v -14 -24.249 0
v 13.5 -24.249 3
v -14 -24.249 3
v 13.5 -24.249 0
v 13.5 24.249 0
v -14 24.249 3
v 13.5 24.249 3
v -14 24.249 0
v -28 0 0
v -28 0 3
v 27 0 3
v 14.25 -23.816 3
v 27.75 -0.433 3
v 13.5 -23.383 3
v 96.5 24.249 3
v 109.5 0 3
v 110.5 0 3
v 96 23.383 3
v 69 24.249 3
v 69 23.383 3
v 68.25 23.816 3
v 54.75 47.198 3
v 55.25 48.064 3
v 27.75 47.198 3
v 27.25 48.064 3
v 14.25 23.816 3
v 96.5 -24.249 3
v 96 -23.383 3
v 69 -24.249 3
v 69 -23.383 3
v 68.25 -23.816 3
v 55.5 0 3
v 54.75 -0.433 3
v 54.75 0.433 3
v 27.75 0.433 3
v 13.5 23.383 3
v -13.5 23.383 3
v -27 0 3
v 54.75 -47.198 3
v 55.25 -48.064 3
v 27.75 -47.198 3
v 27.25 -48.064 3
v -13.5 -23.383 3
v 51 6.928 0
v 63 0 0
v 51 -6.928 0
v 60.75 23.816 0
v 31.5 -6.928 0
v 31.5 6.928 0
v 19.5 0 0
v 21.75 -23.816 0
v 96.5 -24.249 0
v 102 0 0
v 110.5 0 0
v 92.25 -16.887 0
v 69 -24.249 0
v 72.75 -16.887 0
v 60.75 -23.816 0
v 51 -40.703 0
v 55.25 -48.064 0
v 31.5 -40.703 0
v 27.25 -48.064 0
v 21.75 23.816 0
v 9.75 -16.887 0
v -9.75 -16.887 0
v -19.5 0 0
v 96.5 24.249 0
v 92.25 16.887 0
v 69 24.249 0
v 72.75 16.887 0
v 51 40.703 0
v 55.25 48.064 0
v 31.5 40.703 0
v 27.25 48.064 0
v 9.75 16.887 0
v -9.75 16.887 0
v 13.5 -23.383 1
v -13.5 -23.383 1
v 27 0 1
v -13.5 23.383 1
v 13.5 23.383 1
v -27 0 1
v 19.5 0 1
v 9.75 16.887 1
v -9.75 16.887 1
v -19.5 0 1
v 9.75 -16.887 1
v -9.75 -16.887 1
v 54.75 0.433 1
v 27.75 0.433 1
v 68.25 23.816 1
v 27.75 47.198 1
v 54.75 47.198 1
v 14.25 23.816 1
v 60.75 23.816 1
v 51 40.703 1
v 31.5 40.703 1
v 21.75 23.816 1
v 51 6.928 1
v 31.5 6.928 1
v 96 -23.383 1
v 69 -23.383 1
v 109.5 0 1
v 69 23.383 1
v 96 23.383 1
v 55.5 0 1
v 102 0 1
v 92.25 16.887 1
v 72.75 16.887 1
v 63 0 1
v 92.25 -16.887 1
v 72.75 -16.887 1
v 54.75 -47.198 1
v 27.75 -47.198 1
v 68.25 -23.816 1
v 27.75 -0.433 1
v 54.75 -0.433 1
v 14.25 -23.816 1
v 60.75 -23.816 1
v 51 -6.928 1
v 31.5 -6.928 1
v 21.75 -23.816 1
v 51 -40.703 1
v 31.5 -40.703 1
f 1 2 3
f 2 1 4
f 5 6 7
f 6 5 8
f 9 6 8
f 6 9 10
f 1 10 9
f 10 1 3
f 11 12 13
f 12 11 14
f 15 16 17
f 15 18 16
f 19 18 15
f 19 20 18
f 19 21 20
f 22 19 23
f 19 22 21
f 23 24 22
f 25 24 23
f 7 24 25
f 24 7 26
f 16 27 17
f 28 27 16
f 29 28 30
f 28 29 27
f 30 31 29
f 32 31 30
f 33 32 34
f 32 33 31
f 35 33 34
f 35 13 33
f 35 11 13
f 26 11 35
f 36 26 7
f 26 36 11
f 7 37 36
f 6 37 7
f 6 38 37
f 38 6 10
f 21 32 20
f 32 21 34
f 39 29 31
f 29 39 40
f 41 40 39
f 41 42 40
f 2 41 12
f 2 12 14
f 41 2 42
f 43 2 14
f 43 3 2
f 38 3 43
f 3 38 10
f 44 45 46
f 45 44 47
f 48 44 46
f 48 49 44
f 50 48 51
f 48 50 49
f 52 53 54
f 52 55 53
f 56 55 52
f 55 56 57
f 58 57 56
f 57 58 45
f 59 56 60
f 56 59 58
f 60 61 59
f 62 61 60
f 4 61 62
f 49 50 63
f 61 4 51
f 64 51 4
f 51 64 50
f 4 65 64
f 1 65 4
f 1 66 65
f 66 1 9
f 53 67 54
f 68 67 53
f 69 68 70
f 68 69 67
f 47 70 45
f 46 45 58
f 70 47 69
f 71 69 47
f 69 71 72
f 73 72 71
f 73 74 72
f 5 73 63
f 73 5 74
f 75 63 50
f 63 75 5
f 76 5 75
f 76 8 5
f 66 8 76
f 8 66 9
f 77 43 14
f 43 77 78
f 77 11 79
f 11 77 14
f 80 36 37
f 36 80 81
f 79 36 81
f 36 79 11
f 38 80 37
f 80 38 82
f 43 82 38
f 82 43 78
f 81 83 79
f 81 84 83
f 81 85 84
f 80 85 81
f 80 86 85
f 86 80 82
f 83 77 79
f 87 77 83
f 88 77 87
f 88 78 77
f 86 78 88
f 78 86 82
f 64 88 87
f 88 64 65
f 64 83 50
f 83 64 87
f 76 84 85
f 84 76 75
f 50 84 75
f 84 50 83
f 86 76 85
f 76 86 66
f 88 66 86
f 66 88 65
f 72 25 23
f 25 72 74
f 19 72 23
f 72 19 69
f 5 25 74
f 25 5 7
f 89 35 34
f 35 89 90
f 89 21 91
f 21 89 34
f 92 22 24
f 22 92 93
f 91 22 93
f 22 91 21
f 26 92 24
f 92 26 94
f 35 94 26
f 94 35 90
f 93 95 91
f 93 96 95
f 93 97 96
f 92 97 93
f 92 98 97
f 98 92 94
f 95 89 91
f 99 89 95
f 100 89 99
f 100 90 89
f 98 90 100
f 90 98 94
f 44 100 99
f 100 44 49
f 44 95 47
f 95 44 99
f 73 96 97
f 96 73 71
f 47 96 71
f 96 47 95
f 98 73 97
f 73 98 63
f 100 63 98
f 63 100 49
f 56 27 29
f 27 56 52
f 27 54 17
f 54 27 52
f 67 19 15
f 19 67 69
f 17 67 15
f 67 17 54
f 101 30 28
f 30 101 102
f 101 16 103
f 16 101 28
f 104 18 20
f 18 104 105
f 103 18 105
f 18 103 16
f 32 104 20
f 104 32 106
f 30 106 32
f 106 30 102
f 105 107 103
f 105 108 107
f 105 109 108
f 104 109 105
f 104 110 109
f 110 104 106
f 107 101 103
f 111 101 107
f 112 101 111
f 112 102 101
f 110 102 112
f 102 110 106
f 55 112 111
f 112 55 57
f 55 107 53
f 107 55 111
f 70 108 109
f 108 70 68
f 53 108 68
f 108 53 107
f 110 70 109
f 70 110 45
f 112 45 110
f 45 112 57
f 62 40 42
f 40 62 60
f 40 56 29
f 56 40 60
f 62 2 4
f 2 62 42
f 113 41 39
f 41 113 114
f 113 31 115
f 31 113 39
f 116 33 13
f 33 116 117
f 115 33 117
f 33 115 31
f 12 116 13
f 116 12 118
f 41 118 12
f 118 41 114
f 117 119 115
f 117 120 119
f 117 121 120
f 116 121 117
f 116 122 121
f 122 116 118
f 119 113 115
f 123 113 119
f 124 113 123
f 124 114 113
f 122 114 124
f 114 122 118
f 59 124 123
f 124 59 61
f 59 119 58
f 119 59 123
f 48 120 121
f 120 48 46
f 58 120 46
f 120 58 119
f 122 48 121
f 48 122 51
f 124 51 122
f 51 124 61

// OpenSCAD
$fn = 150;

union() {
	translate(v = [0.0, 0.0, 0]) {
		difference() {
			cylinder($fn = 6, d = 56.0, h = 3.0);
			translate(v = [0, 0, 1.0]) {
				cylinder($fn = 6, d = 54.0, h = 3.0);
			}
			translate(v = [0, 0, -1]) {
				cylinder($fn = 6, d = 39, h = 3.0);
			}
		}
	}
	translate(v = [41.25, 23.81569860407206, 0]) {
		difference() {
			cylinder($fn = 6, d = 56.0, h = 3.0);
			translate(v = [0, 0, 1.0]) {
				cylinder($fn = 6, d = 54.0, h = 3.0);
			}
			translate(v = [0, 0, -1]) {
				cylinder($fn = 6, d = 39, h = 3.0);
			}
		}
	}
	translate(v = [82.5, 0.0, 0]) {
		difference() {
			cylinder($fn = 6, d = 56.0, h = 3.0);
			translate(v = [0, 0, 1.0]) {
				cylinder($fn = 6, d = 54.0, h = 3.0);
			}
			translate(v = [0, 0, -1]) {
				cylinder($fn = 6, d = 39, h = 3.0);
			}
		}
	}
	translate(v = [41.25, -23.81569860407206, 0]) {
		difference() {
			cylinder($fn = 6, d = 56.0, h = 3.0);
			translate(v = [0, 0, 1.0]) {
				cylinder($fn = 6, d = 54.0, h = 3.0);
			}
			translate(v = [0, 0, -1]) {
				cylinder($fn = 6, d = 39, h = 3.0);
			}
		}
	}
}
